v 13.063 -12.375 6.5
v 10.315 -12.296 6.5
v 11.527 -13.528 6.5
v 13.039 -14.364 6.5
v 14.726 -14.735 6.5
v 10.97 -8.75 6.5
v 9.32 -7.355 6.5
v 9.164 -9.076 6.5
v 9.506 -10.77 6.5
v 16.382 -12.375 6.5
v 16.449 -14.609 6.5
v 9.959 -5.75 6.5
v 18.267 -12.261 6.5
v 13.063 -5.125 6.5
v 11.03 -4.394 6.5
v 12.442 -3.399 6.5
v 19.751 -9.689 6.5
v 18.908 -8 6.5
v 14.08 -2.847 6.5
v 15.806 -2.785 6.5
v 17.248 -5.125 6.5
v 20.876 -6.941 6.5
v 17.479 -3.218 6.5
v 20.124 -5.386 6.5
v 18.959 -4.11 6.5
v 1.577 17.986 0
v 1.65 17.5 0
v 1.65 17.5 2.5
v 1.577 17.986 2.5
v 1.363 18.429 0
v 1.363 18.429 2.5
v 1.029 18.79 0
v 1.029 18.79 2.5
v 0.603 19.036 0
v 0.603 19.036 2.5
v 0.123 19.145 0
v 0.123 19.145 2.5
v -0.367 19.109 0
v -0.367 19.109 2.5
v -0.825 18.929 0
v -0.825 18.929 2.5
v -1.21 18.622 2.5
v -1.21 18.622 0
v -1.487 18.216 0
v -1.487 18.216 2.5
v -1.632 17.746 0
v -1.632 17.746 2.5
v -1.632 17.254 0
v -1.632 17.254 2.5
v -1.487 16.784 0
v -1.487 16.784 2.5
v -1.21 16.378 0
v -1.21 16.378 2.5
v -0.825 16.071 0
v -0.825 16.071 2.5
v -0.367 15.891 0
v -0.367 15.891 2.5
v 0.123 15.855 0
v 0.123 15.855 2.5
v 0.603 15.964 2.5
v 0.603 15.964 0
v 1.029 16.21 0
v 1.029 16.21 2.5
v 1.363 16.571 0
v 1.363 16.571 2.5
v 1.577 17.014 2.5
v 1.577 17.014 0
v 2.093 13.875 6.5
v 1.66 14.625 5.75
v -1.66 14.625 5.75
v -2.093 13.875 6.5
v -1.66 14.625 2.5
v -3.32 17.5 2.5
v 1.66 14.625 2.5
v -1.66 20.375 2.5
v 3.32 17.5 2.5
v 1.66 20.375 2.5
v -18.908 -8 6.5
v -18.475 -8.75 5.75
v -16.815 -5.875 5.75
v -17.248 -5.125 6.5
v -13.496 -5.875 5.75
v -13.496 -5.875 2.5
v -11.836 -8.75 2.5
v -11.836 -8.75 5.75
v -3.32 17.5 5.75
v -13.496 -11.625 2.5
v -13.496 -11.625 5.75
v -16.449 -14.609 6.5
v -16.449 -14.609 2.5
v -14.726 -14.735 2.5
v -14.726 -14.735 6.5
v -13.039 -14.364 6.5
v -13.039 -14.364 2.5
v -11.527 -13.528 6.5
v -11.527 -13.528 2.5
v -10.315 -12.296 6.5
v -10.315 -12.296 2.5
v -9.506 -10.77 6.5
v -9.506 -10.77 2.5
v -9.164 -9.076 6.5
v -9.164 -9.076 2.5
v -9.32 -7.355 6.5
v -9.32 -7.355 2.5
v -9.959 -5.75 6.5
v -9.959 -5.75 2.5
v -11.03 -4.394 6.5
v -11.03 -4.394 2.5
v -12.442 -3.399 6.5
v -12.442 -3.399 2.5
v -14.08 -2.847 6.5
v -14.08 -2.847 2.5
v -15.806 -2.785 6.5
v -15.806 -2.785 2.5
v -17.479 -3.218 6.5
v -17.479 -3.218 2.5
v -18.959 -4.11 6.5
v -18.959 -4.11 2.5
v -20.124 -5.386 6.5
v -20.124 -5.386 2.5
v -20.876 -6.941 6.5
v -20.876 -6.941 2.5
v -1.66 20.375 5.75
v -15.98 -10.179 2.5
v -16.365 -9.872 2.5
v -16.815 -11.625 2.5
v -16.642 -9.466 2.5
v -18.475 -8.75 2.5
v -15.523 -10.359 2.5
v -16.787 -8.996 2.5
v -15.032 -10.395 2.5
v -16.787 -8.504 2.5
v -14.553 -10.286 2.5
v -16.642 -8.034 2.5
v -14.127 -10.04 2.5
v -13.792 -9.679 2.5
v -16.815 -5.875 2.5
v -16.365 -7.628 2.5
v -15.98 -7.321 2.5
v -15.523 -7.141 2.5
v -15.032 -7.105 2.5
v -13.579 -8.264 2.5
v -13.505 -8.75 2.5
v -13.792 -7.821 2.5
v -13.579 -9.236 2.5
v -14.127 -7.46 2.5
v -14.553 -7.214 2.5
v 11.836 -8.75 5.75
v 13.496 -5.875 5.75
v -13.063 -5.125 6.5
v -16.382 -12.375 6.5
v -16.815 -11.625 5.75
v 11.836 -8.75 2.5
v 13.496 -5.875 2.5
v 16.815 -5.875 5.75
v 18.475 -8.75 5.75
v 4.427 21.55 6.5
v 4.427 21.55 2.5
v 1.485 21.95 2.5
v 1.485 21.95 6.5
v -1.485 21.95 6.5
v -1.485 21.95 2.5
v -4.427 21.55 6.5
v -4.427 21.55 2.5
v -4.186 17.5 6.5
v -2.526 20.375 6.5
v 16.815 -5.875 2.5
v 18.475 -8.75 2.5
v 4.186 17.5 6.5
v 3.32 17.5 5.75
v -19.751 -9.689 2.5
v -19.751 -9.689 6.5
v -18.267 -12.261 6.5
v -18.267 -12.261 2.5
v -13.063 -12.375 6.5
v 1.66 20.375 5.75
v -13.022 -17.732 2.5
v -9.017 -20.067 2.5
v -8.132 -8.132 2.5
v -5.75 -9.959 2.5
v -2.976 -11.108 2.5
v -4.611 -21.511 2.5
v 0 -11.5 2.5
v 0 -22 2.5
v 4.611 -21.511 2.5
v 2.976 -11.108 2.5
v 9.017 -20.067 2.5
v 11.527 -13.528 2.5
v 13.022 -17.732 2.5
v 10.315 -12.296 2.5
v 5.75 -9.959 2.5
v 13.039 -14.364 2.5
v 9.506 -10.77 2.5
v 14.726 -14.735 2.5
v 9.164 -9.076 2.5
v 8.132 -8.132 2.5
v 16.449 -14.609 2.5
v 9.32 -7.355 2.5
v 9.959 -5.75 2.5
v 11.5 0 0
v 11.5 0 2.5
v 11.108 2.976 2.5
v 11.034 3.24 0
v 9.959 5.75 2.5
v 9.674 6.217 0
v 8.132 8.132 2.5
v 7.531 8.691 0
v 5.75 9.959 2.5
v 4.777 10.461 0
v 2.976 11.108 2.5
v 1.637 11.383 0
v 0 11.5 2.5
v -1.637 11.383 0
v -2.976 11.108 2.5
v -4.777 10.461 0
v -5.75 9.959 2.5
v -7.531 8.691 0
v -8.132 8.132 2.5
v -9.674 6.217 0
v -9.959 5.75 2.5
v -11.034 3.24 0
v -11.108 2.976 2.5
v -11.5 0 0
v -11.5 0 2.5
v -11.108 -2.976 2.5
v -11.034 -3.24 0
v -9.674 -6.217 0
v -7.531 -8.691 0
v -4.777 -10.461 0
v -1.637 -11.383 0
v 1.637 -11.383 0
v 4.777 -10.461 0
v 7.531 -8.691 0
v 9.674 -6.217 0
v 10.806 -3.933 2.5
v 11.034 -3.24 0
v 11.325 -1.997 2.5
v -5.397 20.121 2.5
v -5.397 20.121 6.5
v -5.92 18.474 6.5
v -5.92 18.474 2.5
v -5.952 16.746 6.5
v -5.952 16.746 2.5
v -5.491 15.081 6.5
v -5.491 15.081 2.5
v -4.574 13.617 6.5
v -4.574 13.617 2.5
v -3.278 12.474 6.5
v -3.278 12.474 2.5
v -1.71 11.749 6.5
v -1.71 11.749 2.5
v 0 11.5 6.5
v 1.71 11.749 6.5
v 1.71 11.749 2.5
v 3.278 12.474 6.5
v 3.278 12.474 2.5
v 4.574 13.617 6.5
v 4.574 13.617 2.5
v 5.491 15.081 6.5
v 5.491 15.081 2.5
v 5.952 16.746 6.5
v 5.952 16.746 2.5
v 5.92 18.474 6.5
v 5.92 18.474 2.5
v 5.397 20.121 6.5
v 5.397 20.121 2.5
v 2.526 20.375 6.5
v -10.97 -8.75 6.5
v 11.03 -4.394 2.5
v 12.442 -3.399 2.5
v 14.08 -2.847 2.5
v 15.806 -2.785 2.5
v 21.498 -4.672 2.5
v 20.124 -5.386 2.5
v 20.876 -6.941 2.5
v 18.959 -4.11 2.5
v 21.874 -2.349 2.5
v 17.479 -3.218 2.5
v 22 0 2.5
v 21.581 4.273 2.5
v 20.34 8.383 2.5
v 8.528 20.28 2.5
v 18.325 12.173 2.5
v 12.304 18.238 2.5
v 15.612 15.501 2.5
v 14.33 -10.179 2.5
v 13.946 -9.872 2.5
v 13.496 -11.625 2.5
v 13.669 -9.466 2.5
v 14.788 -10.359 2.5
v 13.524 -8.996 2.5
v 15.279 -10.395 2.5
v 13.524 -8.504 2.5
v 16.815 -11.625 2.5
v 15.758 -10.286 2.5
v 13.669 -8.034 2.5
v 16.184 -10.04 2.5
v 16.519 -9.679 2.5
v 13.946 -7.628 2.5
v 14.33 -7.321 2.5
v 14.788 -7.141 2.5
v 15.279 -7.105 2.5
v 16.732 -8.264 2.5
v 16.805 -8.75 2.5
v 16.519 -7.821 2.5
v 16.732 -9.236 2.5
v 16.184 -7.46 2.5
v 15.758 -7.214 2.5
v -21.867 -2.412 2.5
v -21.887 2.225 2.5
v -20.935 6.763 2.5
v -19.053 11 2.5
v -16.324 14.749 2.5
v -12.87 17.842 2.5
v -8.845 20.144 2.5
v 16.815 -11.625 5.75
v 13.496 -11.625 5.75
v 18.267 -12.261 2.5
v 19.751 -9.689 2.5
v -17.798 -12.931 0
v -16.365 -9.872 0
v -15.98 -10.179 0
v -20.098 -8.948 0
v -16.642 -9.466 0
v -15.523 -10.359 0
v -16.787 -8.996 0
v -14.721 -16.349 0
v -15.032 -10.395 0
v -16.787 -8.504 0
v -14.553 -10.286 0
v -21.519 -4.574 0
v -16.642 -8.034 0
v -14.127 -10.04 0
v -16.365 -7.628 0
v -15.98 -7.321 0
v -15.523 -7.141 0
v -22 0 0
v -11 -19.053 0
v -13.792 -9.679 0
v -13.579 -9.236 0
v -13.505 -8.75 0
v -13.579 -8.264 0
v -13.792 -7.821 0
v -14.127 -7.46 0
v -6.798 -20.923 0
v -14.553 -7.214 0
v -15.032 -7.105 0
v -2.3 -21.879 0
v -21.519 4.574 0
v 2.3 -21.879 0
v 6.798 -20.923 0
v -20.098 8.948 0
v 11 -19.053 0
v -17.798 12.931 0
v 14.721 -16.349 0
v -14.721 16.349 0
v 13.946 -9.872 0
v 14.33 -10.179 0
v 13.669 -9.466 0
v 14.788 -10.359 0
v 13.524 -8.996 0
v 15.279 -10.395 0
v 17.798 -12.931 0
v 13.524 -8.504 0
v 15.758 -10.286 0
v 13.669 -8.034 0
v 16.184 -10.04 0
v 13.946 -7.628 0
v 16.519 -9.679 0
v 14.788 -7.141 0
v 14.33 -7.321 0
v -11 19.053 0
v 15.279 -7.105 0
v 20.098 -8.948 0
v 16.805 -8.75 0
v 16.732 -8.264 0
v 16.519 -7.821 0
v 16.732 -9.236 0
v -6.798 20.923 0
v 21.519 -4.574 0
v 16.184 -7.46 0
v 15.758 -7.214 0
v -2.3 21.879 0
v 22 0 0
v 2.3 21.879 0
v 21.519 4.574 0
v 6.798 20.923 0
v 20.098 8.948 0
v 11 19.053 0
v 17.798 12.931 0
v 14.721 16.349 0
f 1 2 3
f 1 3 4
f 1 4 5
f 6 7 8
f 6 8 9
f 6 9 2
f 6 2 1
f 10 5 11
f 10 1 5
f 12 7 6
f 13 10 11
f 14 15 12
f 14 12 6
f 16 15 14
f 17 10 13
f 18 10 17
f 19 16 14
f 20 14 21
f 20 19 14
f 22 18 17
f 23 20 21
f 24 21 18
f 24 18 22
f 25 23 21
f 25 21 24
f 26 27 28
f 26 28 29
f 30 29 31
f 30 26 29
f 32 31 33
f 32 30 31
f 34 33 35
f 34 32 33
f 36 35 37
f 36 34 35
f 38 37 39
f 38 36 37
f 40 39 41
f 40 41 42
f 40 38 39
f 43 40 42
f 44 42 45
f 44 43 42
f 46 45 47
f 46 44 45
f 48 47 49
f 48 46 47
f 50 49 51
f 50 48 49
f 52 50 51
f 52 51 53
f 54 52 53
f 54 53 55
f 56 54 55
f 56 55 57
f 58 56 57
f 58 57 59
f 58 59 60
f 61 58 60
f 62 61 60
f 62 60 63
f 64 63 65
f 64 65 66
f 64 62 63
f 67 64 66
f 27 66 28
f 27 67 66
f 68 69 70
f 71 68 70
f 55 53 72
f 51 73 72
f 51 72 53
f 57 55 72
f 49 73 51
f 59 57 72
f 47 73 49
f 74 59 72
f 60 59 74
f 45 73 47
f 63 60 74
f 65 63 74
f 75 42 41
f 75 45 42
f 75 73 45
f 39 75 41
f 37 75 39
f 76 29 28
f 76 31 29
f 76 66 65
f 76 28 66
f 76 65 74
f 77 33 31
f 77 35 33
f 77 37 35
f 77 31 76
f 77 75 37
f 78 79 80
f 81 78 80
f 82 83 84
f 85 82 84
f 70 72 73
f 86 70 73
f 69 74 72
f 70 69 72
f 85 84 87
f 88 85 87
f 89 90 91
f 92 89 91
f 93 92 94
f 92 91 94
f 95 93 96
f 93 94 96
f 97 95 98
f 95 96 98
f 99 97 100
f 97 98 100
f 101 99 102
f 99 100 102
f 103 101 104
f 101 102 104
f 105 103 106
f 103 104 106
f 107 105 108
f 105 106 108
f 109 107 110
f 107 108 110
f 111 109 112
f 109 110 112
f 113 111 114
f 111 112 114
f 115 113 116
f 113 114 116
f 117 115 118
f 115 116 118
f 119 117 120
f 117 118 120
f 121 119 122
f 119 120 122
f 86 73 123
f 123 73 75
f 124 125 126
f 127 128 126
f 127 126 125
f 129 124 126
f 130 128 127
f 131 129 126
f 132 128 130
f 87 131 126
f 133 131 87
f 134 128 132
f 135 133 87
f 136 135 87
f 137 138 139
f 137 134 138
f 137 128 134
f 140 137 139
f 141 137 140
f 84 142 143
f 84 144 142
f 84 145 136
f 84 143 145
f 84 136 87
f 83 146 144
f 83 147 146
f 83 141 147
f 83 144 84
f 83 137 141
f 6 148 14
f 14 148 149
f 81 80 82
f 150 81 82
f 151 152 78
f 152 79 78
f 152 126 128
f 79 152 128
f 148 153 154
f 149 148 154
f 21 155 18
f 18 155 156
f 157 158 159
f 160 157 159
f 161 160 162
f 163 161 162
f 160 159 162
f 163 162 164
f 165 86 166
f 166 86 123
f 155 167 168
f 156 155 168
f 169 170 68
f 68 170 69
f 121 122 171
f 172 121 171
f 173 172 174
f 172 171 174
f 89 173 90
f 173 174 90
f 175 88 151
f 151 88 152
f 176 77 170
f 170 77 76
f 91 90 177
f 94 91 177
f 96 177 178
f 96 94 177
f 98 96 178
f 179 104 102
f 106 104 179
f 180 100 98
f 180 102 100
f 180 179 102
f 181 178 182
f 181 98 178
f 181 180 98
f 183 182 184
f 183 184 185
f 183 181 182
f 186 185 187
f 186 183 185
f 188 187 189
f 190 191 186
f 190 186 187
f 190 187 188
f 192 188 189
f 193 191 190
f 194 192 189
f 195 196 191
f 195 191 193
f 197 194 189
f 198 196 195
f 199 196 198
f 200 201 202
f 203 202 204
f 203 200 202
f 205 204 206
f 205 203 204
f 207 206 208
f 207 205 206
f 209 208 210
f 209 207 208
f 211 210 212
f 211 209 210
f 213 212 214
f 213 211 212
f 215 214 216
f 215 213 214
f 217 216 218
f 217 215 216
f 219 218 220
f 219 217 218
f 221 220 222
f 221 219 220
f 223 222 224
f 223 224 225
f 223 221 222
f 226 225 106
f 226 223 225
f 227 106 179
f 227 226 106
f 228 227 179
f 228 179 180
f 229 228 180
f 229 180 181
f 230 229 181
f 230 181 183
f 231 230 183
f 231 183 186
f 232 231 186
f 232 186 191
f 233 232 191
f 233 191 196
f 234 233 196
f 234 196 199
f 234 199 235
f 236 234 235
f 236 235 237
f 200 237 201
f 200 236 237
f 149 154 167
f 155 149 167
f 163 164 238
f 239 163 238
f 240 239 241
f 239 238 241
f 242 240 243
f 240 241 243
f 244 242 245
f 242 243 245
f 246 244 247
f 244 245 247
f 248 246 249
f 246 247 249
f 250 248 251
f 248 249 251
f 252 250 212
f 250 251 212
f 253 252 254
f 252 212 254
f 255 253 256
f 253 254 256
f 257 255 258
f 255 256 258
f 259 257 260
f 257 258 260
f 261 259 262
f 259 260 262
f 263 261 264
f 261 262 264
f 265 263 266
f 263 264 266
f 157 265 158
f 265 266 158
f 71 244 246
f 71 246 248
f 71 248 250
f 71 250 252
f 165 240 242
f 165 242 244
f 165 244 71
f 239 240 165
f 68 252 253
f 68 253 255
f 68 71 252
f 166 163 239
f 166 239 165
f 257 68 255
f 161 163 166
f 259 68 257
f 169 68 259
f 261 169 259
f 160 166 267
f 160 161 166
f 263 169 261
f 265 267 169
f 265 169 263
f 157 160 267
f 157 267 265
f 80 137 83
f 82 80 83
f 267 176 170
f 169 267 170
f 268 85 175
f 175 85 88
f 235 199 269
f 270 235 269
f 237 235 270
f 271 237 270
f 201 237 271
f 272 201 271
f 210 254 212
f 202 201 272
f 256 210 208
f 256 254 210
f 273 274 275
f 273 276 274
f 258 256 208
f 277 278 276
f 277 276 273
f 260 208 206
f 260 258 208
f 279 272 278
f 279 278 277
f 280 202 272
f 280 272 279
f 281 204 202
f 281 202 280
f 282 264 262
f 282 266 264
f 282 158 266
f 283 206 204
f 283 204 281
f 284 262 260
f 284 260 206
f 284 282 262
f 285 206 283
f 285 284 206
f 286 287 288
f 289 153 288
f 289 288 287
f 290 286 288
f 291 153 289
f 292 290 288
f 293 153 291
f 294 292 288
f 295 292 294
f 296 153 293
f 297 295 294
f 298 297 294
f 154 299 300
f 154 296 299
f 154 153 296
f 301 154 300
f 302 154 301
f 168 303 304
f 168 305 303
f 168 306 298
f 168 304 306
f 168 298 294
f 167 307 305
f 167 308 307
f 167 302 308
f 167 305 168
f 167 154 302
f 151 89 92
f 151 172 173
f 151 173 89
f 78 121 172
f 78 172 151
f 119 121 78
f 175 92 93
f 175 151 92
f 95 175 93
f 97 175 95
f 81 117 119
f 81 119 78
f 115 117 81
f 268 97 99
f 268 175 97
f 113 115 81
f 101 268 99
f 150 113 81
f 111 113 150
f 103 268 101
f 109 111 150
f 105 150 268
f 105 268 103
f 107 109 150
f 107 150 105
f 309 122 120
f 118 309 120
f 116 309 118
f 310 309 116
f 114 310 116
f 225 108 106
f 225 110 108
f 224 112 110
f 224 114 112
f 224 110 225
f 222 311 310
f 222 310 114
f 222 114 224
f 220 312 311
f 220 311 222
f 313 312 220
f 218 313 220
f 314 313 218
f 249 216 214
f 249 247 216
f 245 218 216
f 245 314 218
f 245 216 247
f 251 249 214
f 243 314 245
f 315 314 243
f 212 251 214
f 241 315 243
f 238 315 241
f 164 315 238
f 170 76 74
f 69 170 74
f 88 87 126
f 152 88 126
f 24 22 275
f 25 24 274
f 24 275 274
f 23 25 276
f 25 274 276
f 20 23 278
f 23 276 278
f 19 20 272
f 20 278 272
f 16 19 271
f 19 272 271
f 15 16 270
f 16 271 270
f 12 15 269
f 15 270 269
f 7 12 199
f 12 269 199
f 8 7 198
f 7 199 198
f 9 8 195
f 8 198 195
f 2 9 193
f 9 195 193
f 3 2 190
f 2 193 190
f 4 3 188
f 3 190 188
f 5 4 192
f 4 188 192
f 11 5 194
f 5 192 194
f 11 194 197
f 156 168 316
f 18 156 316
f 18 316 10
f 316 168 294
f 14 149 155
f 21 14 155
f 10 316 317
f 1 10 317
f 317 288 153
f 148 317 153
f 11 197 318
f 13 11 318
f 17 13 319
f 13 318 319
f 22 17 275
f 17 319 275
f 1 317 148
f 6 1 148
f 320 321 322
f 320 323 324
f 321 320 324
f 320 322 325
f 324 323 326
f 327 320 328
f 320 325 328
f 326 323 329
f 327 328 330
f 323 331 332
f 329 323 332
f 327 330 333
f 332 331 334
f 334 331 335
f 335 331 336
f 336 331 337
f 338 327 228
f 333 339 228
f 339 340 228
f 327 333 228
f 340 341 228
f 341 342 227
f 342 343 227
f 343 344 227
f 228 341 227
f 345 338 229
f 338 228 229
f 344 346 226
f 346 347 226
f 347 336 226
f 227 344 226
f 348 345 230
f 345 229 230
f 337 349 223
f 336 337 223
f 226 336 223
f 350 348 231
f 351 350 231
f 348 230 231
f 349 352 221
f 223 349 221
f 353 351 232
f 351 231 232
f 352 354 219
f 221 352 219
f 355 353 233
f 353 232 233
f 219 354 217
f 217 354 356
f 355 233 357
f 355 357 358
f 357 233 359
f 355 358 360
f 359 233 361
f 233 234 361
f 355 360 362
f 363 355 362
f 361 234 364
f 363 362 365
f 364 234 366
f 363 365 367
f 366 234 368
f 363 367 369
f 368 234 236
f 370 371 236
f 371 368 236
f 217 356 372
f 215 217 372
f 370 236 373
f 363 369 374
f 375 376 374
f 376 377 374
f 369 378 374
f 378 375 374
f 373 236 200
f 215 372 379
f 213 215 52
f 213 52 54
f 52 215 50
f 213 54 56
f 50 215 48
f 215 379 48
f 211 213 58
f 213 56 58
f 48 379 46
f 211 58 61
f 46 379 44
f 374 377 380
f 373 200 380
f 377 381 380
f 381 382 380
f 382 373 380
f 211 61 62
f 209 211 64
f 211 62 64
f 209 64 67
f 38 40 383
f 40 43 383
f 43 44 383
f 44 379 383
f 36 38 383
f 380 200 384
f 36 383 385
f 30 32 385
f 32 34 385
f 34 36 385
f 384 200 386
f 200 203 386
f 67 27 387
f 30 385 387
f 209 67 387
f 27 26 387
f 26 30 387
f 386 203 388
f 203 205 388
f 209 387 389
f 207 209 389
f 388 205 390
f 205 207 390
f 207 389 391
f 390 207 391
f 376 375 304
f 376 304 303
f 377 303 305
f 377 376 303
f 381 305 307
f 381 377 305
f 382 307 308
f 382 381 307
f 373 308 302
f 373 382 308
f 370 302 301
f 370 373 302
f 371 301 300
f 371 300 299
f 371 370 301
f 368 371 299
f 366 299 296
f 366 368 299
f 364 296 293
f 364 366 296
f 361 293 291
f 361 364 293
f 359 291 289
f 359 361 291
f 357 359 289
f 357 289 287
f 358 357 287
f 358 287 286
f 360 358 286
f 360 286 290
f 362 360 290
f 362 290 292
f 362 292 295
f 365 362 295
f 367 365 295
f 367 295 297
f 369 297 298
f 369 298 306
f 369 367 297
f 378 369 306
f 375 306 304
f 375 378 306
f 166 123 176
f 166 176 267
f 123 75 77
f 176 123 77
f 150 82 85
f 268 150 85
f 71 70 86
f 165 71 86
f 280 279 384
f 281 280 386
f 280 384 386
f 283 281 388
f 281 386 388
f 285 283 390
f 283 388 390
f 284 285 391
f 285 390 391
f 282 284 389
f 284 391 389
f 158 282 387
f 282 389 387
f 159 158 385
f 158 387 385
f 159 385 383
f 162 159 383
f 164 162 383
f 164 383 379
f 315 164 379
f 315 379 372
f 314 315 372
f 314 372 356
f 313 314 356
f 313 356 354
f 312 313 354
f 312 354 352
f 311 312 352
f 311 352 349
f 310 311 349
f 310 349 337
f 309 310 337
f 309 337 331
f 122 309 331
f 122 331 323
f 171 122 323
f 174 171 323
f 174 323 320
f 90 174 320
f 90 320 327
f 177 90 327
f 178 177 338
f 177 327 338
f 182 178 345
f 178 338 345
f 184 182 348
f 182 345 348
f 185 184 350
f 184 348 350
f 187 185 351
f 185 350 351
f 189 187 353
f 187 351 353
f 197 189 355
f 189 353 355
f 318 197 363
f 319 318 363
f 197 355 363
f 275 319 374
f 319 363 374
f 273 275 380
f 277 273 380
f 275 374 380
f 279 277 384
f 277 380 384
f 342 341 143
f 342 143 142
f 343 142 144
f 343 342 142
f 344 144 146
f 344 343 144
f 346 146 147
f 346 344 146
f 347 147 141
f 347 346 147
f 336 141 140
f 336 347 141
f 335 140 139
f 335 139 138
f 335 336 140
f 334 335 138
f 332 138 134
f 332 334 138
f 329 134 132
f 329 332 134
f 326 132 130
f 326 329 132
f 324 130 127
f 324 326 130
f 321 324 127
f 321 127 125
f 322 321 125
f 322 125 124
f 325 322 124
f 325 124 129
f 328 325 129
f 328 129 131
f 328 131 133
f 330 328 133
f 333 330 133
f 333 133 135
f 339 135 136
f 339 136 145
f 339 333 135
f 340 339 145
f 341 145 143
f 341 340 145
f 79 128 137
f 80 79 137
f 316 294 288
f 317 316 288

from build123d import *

# Parameters (mm, degrees)
SKETCH1_R           = 22
SKETCH1_R_2         = 11.5
SKETCH1_R_3         = 1.65
BOSS_EXTRUDE1_DEPTH = 2.5
BOSS_EXTRUDE2_DEPTH = 4
CHAMFER1_SIZE       = 0.75


with BuildPart() as part:
    # Sketch1 → Boss-Extrude1 (new body)
    with BuildSketch(Plane.XY):
        Circle(SKETCH1_R)
        Circle(SKETCH1_R_2, mode=Mode.SUBTRACT)
        with Locations((0, 17.5)):
            Circle(SKETCH1_R_3, mode=Mode.SUBTRACT)
        with Locations((15.155444566, -8.75)):
            Circle(SKETCH1_R_3, mode=Mode.SUBTRACT)
        with Locations((-15.155444566, -8.75)):
            Circle(SKETCH1_R_3, mode=Mode.SUBTRACT)
    extrude(amount=BOSS_EXTRUDE1_DEPTH)

    # Sketch2 → Boss-Extrude2 (add)
    # profile 1 of 3: a face of its own
    with BuildSketch(Plane.XY.offset(2.5)):
        with BuildLine():
            ThreePointArc((4.426906369, 21.55), (0, 22), (-4.426906369, 21.55))
            ThreePointArc((-4.426906369, 21.55), (0, 11.5), (4.426906369, 21.55))
        make_face()
        Polygon((1.659882024, 20.375), (3.319764048, 17.5), (1.659882024, 14.625), (-1.659882024, 14.625), (-3.319764048, 17.5), (-1.659882024, 20.375), align=None, mode=Mode.SUBTRACT)
    # profile 2 of 3: a face of its own
    with BuildSketch(Plane.XY.offset(2.5)):
        with BuildLine():
            ThreePointArc((-16.449394267, -14.608813376), (-9.959292144, -5.75), (-20.876300636, -6.941186624))
            ThreePointArc((-20.876300636, -6.941186624), (-19.052558883, -11), (-16.449394267, -14.608813376))
        make_face()
        Polygon((-18.475208614, -8.75), (-16.81532659, -5.875), (-13.495562542, -5.875), (-11.835680518, -8.75), (-13.495562542, -11.625), (-16.81532659, -11.625), align=None, mode=Mode.SUBTRACT)
    # profile 3 of 3: a face of its own
    with BuildSketch(Plane.XY.offset(2.5)):
        with BuildLine():
            ThreePointArc((16.449394267, -14.608813376), (19.052558883, -11), (20.876300636, -6.941186624))
            ThreePointArc((20.876300636, -6.941186624), (9.959292144, -5.75), (16.449394267, -14.608813376))
        make_face()
        Polygon((16.81532659, -11.625), (13.495562542, -11.625), (11.835680518, -8.75), (13.495562542, -5.875), (16.81532659, -5.875), (18.475208614, -8.75), align=None, mode=Mode.SUBTRACT)
    extrude(amount=BOSS_EXTRUDE2_DEPTH)

    # Chamfer1
    chamfer1_edges = [part.edges().sort_by_distance(p)[0] for p in [
        (2.489823036, 16.0625, 6.5),
        (0, 14.625, 6.5),
        (-2.489823036, 16.0625, 6.5),
        (-2.489823036, 18.9375, 6.5),
        (2.489823036, 18.9375, 6.5),
        (-15.155444566, -5.875, 6.5),
        (-12.66562153, -7.3125, 6.5),
        (-12.66562153, -10.1875, 6.5),
        (-15.155444566, -11.625, 6.5),
        (-17.645267602, -7.3125, 6.5),
        (12.66562153, -10.1875, 6.5),
        (12.66562153, -7.3125, 6.5),
        (15.155444566, -5.875, 6.5),
        (17.645267602, -7.3125, 6.5),
        (15.155444566, -11.625, 6.5),
    ]]
    chamfer(chamfer1_edges, length=CHAMFER1_SIZE)


solid = part.part
